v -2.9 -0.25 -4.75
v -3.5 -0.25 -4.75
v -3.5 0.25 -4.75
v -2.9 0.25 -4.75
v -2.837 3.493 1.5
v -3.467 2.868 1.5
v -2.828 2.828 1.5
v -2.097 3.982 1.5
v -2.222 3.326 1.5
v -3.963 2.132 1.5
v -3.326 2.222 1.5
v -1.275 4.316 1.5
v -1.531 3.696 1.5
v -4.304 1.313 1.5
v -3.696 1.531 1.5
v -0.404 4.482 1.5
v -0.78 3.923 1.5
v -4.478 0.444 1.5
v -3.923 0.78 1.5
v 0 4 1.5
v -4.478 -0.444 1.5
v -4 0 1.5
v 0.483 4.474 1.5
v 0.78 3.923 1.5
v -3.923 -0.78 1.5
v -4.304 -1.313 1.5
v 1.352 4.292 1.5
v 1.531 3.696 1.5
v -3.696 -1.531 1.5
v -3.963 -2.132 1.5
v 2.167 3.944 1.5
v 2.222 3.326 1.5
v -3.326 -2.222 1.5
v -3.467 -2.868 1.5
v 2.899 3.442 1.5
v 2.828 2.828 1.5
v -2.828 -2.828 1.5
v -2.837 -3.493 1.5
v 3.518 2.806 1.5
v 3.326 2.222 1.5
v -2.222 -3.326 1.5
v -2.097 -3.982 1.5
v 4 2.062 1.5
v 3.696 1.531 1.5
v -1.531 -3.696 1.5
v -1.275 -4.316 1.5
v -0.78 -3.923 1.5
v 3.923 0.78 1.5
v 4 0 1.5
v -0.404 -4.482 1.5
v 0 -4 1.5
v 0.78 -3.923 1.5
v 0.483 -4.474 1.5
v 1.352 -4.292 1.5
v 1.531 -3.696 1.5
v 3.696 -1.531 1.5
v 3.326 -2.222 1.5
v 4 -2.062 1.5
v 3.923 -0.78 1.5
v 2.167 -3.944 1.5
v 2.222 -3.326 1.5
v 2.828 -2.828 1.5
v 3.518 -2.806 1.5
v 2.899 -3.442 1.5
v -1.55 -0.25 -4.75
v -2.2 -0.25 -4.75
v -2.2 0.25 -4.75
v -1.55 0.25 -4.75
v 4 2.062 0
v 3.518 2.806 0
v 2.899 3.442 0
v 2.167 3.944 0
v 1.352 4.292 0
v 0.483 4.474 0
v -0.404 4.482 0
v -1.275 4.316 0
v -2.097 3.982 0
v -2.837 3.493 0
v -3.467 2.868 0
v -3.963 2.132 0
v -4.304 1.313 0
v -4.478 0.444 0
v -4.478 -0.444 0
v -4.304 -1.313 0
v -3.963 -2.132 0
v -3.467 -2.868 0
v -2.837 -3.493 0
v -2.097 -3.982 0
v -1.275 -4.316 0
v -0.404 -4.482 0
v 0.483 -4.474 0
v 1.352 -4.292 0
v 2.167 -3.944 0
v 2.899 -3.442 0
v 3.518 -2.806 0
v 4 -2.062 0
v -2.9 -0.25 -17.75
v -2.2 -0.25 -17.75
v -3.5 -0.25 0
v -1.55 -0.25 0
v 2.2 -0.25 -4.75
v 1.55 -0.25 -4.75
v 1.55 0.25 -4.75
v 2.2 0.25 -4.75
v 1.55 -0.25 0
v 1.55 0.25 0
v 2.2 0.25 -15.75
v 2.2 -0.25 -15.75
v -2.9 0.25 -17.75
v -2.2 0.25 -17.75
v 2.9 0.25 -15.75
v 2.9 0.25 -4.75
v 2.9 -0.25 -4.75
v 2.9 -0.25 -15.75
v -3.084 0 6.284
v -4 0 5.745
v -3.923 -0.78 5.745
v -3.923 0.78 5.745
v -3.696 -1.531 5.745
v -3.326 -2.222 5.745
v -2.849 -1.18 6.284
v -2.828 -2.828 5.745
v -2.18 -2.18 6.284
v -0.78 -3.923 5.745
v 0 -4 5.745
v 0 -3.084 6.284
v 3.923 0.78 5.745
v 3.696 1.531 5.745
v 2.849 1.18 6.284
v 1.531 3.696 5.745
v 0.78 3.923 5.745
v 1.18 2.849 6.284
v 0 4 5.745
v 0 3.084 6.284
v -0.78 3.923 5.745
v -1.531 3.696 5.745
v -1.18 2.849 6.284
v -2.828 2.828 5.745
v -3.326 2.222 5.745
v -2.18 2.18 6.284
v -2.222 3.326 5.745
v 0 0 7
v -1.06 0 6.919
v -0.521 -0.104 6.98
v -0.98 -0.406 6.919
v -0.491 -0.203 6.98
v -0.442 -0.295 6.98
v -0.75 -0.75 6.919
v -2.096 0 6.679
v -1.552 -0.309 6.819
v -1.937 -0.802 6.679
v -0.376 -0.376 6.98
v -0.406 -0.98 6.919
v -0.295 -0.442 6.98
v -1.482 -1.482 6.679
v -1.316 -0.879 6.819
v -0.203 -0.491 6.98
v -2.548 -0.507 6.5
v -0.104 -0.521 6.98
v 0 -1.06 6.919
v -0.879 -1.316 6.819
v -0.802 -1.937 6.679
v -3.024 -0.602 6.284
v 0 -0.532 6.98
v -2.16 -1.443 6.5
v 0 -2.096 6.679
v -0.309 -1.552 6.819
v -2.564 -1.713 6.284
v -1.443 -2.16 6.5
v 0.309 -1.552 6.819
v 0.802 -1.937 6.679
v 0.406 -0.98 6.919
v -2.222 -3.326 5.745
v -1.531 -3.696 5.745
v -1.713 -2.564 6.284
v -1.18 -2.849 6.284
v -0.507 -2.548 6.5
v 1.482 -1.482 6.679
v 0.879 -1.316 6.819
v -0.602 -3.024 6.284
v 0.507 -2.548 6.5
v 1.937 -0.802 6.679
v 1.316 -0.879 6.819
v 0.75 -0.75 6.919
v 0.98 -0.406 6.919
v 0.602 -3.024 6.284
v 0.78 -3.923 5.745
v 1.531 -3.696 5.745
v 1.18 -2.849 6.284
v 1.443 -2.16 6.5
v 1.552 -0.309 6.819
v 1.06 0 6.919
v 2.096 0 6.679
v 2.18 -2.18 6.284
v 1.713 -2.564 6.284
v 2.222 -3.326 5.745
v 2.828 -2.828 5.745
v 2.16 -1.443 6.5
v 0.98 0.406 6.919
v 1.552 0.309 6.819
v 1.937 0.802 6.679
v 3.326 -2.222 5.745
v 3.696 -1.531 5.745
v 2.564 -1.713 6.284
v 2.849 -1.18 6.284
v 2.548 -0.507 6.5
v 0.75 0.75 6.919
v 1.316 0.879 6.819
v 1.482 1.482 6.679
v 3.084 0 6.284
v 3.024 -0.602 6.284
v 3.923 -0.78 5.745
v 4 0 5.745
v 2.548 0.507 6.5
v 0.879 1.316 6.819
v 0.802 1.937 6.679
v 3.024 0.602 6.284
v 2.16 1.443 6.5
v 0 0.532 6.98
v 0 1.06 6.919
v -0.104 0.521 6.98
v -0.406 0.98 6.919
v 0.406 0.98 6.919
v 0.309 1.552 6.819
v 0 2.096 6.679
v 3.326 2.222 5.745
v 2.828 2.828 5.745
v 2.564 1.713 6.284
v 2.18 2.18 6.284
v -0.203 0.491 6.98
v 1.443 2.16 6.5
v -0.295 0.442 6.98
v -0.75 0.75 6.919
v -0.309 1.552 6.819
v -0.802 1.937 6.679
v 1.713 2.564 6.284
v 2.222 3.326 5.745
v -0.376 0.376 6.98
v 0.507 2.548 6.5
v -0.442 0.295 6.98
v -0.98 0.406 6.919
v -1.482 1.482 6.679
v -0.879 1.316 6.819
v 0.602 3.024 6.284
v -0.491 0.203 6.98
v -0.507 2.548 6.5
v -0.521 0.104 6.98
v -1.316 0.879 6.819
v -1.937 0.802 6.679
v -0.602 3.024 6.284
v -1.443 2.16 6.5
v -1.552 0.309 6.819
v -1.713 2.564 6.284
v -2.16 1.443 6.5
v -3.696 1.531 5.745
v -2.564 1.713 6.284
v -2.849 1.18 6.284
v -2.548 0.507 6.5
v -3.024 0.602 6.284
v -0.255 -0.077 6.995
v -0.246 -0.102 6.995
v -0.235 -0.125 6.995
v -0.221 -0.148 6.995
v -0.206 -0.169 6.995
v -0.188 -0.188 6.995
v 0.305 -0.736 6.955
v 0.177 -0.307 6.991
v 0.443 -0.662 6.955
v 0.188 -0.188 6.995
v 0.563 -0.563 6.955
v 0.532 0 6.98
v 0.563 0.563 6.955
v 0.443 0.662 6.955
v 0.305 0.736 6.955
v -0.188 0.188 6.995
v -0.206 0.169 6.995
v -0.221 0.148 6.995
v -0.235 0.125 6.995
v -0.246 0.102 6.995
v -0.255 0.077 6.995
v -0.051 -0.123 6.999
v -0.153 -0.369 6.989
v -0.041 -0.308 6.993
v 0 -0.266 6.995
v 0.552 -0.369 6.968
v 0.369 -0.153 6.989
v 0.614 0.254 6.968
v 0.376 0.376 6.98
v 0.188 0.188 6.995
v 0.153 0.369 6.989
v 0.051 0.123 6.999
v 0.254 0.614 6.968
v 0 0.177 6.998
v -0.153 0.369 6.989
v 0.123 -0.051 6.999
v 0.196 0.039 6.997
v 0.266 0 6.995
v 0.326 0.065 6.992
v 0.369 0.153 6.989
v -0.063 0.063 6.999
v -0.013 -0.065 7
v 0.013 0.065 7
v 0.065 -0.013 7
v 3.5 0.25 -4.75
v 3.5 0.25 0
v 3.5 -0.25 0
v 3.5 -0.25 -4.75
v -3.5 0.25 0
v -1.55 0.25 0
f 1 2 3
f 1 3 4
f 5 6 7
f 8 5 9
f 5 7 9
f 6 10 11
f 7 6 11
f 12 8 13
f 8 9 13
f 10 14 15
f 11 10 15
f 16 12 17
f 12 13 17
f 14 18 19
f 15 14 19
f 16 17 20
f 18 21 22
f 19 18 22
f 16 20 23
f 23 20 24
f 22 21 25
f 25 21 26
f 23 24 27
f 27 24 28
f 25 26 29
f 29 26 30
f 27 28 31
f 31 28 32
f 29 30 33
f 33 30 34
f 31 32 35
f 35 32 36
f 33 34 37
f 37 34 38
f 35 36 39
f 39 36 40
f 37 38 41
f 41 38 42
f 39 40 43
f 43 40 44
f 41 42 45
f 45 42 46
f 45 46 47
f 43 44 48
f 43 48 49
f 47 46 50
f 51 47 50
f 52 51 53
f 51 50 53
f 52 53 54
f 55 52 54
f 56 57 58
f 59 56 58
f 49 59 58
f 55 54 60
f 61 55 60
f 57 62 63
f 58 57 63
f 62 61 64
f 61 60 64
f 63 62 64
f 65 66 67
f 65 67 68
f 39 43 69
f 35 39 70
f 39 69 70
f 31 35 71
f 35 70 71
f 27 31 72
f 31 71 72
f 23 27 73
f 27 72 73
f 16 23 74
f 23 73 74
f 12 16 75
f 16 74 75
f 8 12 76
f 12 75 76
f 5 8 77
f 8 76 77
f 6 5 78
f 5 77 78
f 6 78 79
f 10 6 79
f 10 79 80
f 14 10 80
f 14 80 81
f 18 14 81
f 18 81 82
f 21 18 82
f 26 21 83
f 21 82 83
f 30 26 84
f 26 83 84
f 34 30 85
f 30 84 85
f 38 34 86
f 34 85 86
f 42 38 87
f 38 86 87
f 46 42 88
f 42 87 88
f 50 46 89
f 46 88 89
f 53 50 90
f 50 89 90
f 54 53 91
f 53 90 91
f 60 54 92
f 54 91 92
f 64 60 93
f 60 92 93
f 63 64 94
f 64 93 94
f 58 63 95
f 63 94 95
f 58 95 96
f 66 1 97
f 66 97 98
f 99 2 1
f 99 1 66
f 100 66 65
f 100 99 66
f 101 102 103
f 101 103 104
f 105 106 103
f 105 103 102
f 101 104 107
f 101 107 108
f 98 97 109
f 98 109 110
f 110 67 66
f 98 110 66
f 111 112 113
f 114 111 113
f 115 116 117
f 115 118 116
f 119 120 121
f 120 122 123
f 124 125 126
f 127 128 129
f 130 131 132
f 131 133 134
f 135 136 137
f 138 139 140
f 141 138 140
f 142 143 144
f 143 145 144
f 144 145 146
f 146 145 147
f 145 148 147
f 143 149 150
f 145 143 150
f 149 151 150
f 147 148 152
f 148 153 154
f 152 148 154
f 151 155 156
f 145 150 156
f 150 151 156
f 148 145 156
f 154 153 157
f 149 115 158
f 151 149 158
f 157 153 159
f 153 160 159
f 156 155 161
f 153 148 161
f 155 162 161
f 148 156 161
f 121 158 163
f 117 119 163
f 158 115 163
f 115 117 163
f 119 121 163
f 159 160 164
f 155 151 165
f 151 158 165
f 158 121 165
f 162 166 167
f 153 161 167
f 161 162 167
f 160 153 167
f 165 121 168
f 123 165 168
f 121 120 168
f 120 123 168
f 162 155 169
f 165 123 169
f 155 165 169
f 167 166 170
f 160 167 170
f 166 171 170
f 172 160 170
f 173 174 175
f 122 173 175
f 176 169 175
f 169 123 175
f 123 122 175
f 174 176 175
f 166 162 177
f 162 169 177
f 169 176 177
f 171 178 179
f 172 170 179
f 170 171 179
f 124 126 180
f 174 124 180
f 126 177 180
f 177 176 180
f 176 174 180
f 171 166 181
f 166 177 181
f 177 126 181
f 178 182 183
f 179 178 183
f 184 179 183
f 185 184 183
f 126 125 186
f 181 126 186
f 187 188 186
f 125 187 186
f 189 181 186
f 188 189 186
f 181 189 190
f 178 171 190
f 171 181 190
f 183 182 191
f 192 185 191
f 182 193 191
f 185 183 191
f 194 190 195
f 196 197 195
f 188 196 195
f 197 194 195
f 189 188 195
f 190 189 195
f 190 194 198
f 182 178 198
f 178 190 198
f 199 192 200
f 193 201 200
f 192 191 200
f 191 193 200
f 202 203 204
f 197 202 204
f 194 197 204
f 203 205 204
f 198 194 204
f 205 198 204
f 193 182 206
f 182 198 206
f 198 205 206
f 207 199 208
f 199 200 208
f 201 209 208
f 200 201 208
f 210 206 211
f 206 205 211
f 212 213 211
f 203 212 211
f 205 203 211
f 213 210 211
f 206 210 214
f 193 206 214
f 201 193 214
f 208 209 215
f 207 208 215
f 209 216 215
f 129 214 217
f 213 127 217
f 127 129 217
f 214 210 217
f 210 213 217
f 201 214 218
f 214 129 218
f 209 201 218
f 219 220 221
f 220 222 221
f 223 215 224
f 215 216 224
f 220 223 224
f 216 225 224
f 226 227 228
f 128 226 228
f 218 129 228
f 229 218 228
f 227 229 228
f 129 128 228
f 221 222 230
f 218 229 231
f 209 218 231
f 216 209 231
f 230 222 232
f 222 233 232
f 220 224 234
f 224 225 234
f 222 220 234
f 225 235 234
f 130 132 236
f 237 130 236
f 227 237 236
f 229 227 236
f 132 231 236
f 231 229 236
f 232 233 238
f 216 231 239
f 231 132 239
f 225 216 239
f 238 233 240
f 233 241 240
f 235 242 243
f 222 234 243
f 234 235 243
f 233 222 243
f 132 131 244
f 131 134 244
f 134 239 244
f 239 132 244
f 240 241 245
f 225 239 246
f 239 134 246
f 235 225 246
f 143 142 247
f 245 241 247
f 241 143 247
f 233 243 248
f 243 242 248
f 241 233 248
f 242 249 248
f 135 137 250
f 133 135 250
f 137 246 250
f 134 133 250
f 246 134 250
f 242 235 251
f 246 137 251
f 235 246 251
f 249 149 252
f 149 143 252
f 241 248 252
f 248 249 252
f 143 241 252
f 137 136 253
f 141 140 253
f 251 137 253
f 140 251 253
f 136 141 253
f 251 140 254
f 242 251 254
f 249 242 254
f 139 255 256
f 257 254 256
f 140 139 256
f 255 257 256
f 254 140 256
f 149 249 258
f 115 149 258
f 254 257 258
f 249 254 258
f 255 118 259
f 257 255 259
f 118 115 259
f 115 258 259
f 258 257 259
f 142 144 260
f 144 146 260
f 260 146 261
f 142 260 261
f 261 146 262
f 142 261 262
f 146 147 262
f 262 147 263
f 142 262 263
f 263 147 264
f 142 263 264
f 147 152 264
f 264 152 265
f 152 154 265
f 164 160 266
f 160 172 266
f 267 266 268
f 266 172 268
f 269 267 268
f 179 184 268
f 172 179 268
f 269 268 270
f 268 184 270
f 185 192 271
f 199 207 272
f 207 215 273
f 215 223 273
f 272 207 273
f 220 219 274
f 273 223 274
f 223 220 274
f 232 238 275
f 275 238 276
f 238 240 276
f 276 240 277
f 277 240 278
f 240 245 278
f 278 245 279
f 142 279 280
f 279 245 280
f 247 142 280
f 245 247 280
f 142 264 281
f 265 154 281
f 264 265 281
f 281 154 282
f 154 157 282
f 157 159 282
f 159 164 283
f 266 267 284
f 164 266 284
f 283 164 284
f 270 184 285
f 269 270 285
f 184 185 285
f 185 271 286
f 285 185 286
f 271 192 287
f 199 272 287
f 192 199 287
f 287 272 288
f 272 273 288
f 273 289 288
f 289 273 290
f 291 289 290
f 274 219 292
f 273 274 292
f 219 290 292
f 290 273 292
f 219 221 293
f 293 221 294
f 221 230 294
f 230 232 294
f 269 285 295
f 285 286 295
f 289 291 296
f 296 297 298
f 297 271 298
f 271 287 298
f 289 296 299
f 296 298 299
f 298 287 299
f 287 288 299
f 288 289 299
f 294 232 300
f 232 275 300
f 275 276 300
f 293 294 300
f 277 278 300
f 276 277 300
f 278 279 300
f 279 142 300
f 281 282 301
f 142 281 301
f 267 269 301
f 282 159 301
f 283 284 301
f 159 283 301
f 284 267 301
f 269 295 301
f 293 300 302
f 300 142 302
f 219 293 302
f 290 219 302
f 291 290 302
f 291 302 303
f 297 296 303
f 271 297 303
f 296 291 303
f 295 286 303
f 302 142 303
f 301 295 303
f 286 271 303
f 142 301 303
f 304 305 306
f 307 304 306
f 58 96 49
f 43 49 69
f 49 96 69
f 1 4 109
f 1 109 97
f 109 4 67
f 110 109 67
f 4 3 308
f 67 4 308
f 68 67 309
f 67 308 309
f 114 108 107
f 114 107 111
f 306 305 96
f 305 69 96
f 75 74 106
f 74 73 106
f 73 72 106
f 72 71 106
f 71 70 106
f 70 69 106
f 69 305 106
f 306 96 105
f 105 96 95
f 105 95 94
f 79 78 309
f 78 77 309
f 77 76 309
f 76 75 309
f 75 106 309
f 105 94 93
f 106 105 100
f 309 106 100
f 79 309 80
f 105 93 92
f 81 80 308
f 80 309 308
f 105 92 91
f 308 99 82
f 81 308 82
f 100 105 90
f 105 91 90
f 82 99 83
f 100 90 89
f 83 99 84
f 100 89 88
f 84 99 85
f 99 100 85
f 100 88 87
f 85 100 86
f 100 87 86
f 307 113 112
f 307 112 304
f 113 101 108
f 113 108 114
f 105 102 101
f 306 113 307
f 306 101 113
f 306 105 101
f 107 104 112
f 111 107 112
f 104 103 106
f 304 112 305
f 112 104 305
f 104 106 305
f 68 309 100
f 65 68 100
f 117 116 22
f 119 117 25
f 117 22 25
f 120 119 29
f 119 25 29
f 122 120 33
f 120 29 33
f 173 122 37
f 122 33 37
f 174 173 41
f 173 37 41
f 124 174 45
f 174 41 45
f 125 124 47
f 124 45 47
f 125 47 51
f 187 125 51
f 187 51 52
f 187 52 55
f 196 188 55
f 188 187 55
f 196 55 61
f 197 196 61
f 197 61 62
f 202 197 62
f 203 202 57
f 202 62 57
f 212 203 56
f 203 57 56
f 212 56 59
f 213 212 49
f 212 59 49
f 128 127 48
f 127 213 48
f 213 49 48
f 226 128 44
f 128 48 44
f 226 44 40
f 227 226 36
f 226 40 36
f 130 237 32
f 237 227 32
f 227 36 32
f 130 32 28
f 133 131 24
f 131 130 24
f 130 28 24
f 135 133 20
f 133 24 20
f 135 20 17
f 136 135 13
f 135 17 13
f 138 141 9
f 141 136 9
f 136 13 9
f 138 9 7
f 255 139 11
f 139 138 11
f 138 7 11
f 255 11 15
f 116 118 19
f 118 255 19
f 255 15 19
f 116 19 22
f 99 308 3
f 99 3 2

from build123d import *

# Parameters (mm, degrees)
F3_DEPTH = 7.001
F4_W     = 1.95
F4_H     = 0.5
F5_DEPTH = 4.75
F6_W     = 0.7
F6_H     = 0.5
F7_DEPTH = 11
F8_W     = 0.7
F8_H     = 0.5
F9_DEPTH = 13


with BuildPart() as f1:
    # F0 (on Front) → F1 (revolve)
    with BuildSketch(Plane.XZ):
        with BuildLine():
            Line((-4.5, 0), (0, 0))
            Line((0, 0), (0, 7))
            ThreePointArc((0, 7), (-2.096194, 6.67877), (-4, 5.744563))
            Line((-4, 5.744563), (-4, 1.5))
            Line((-4, 1.5), (-4.5, 1.5))
            Line((-4.5, 1.5), (-4.5, 0))
        make_face()
    revolve(axis=Axis((0, 0, 3.5), (0, 0, 1)))

    # F2 (on face) → F3 (cut, through all)
    with BuildSketch(Plane(origin=(0, 0, 0), x_dir=(1, 0, 0), z_dir=(0, 0, -1))):
        with BuildLine():
            ThreePointArc((4, -2.061553), (4.5, 0), (4, 2.061553))
            Line((4, 2.061553), (4, -2.061553))
        make_face()
    extrude(amount=-F3_DEPTH, mode=Mode.SUBTRACT)

    # F4 (on face) → F5 (join)
    with BuildSketch(Plane(origin=(0, 0, 0), x_dir=(1, 0, 0), z_dir=(0, 0, -1))):
        with Locations((2.525, 0)):
            Rectangle(F4_W, F4_H)
        with Locations((-2.525, 0)):
            Rectangle(F4_W, F4_H)
    extrude(amount=F5_DEPTH)

    # F6 (on face) → F7 (join)
    with BuildSketch(Plane(origin=(0, 0, -4.75), x_dir=(1, 0, 0), z_dir=(0, 0, -1))):
        with Locations((2.55, 0)):
            Rectangle(F6_W, F6_H)
    extrude(amount=F7_DEPTH)

    # F8 (on face) → F9 (join)
    with BuildSketch(Plane(origin=(0, 0, -4.75), x_dir=(1, 0, 0), z_dir=(0, 0, -1))):
        with Locations((-2.55, 0)):
            Rectangle(F8_W, F8_H)
    extrude(amount=F9_DEPTH)


with BuildPart() as f10_1:
    # F10: copy of F1
    add(f1.part)


solid = f1.part
